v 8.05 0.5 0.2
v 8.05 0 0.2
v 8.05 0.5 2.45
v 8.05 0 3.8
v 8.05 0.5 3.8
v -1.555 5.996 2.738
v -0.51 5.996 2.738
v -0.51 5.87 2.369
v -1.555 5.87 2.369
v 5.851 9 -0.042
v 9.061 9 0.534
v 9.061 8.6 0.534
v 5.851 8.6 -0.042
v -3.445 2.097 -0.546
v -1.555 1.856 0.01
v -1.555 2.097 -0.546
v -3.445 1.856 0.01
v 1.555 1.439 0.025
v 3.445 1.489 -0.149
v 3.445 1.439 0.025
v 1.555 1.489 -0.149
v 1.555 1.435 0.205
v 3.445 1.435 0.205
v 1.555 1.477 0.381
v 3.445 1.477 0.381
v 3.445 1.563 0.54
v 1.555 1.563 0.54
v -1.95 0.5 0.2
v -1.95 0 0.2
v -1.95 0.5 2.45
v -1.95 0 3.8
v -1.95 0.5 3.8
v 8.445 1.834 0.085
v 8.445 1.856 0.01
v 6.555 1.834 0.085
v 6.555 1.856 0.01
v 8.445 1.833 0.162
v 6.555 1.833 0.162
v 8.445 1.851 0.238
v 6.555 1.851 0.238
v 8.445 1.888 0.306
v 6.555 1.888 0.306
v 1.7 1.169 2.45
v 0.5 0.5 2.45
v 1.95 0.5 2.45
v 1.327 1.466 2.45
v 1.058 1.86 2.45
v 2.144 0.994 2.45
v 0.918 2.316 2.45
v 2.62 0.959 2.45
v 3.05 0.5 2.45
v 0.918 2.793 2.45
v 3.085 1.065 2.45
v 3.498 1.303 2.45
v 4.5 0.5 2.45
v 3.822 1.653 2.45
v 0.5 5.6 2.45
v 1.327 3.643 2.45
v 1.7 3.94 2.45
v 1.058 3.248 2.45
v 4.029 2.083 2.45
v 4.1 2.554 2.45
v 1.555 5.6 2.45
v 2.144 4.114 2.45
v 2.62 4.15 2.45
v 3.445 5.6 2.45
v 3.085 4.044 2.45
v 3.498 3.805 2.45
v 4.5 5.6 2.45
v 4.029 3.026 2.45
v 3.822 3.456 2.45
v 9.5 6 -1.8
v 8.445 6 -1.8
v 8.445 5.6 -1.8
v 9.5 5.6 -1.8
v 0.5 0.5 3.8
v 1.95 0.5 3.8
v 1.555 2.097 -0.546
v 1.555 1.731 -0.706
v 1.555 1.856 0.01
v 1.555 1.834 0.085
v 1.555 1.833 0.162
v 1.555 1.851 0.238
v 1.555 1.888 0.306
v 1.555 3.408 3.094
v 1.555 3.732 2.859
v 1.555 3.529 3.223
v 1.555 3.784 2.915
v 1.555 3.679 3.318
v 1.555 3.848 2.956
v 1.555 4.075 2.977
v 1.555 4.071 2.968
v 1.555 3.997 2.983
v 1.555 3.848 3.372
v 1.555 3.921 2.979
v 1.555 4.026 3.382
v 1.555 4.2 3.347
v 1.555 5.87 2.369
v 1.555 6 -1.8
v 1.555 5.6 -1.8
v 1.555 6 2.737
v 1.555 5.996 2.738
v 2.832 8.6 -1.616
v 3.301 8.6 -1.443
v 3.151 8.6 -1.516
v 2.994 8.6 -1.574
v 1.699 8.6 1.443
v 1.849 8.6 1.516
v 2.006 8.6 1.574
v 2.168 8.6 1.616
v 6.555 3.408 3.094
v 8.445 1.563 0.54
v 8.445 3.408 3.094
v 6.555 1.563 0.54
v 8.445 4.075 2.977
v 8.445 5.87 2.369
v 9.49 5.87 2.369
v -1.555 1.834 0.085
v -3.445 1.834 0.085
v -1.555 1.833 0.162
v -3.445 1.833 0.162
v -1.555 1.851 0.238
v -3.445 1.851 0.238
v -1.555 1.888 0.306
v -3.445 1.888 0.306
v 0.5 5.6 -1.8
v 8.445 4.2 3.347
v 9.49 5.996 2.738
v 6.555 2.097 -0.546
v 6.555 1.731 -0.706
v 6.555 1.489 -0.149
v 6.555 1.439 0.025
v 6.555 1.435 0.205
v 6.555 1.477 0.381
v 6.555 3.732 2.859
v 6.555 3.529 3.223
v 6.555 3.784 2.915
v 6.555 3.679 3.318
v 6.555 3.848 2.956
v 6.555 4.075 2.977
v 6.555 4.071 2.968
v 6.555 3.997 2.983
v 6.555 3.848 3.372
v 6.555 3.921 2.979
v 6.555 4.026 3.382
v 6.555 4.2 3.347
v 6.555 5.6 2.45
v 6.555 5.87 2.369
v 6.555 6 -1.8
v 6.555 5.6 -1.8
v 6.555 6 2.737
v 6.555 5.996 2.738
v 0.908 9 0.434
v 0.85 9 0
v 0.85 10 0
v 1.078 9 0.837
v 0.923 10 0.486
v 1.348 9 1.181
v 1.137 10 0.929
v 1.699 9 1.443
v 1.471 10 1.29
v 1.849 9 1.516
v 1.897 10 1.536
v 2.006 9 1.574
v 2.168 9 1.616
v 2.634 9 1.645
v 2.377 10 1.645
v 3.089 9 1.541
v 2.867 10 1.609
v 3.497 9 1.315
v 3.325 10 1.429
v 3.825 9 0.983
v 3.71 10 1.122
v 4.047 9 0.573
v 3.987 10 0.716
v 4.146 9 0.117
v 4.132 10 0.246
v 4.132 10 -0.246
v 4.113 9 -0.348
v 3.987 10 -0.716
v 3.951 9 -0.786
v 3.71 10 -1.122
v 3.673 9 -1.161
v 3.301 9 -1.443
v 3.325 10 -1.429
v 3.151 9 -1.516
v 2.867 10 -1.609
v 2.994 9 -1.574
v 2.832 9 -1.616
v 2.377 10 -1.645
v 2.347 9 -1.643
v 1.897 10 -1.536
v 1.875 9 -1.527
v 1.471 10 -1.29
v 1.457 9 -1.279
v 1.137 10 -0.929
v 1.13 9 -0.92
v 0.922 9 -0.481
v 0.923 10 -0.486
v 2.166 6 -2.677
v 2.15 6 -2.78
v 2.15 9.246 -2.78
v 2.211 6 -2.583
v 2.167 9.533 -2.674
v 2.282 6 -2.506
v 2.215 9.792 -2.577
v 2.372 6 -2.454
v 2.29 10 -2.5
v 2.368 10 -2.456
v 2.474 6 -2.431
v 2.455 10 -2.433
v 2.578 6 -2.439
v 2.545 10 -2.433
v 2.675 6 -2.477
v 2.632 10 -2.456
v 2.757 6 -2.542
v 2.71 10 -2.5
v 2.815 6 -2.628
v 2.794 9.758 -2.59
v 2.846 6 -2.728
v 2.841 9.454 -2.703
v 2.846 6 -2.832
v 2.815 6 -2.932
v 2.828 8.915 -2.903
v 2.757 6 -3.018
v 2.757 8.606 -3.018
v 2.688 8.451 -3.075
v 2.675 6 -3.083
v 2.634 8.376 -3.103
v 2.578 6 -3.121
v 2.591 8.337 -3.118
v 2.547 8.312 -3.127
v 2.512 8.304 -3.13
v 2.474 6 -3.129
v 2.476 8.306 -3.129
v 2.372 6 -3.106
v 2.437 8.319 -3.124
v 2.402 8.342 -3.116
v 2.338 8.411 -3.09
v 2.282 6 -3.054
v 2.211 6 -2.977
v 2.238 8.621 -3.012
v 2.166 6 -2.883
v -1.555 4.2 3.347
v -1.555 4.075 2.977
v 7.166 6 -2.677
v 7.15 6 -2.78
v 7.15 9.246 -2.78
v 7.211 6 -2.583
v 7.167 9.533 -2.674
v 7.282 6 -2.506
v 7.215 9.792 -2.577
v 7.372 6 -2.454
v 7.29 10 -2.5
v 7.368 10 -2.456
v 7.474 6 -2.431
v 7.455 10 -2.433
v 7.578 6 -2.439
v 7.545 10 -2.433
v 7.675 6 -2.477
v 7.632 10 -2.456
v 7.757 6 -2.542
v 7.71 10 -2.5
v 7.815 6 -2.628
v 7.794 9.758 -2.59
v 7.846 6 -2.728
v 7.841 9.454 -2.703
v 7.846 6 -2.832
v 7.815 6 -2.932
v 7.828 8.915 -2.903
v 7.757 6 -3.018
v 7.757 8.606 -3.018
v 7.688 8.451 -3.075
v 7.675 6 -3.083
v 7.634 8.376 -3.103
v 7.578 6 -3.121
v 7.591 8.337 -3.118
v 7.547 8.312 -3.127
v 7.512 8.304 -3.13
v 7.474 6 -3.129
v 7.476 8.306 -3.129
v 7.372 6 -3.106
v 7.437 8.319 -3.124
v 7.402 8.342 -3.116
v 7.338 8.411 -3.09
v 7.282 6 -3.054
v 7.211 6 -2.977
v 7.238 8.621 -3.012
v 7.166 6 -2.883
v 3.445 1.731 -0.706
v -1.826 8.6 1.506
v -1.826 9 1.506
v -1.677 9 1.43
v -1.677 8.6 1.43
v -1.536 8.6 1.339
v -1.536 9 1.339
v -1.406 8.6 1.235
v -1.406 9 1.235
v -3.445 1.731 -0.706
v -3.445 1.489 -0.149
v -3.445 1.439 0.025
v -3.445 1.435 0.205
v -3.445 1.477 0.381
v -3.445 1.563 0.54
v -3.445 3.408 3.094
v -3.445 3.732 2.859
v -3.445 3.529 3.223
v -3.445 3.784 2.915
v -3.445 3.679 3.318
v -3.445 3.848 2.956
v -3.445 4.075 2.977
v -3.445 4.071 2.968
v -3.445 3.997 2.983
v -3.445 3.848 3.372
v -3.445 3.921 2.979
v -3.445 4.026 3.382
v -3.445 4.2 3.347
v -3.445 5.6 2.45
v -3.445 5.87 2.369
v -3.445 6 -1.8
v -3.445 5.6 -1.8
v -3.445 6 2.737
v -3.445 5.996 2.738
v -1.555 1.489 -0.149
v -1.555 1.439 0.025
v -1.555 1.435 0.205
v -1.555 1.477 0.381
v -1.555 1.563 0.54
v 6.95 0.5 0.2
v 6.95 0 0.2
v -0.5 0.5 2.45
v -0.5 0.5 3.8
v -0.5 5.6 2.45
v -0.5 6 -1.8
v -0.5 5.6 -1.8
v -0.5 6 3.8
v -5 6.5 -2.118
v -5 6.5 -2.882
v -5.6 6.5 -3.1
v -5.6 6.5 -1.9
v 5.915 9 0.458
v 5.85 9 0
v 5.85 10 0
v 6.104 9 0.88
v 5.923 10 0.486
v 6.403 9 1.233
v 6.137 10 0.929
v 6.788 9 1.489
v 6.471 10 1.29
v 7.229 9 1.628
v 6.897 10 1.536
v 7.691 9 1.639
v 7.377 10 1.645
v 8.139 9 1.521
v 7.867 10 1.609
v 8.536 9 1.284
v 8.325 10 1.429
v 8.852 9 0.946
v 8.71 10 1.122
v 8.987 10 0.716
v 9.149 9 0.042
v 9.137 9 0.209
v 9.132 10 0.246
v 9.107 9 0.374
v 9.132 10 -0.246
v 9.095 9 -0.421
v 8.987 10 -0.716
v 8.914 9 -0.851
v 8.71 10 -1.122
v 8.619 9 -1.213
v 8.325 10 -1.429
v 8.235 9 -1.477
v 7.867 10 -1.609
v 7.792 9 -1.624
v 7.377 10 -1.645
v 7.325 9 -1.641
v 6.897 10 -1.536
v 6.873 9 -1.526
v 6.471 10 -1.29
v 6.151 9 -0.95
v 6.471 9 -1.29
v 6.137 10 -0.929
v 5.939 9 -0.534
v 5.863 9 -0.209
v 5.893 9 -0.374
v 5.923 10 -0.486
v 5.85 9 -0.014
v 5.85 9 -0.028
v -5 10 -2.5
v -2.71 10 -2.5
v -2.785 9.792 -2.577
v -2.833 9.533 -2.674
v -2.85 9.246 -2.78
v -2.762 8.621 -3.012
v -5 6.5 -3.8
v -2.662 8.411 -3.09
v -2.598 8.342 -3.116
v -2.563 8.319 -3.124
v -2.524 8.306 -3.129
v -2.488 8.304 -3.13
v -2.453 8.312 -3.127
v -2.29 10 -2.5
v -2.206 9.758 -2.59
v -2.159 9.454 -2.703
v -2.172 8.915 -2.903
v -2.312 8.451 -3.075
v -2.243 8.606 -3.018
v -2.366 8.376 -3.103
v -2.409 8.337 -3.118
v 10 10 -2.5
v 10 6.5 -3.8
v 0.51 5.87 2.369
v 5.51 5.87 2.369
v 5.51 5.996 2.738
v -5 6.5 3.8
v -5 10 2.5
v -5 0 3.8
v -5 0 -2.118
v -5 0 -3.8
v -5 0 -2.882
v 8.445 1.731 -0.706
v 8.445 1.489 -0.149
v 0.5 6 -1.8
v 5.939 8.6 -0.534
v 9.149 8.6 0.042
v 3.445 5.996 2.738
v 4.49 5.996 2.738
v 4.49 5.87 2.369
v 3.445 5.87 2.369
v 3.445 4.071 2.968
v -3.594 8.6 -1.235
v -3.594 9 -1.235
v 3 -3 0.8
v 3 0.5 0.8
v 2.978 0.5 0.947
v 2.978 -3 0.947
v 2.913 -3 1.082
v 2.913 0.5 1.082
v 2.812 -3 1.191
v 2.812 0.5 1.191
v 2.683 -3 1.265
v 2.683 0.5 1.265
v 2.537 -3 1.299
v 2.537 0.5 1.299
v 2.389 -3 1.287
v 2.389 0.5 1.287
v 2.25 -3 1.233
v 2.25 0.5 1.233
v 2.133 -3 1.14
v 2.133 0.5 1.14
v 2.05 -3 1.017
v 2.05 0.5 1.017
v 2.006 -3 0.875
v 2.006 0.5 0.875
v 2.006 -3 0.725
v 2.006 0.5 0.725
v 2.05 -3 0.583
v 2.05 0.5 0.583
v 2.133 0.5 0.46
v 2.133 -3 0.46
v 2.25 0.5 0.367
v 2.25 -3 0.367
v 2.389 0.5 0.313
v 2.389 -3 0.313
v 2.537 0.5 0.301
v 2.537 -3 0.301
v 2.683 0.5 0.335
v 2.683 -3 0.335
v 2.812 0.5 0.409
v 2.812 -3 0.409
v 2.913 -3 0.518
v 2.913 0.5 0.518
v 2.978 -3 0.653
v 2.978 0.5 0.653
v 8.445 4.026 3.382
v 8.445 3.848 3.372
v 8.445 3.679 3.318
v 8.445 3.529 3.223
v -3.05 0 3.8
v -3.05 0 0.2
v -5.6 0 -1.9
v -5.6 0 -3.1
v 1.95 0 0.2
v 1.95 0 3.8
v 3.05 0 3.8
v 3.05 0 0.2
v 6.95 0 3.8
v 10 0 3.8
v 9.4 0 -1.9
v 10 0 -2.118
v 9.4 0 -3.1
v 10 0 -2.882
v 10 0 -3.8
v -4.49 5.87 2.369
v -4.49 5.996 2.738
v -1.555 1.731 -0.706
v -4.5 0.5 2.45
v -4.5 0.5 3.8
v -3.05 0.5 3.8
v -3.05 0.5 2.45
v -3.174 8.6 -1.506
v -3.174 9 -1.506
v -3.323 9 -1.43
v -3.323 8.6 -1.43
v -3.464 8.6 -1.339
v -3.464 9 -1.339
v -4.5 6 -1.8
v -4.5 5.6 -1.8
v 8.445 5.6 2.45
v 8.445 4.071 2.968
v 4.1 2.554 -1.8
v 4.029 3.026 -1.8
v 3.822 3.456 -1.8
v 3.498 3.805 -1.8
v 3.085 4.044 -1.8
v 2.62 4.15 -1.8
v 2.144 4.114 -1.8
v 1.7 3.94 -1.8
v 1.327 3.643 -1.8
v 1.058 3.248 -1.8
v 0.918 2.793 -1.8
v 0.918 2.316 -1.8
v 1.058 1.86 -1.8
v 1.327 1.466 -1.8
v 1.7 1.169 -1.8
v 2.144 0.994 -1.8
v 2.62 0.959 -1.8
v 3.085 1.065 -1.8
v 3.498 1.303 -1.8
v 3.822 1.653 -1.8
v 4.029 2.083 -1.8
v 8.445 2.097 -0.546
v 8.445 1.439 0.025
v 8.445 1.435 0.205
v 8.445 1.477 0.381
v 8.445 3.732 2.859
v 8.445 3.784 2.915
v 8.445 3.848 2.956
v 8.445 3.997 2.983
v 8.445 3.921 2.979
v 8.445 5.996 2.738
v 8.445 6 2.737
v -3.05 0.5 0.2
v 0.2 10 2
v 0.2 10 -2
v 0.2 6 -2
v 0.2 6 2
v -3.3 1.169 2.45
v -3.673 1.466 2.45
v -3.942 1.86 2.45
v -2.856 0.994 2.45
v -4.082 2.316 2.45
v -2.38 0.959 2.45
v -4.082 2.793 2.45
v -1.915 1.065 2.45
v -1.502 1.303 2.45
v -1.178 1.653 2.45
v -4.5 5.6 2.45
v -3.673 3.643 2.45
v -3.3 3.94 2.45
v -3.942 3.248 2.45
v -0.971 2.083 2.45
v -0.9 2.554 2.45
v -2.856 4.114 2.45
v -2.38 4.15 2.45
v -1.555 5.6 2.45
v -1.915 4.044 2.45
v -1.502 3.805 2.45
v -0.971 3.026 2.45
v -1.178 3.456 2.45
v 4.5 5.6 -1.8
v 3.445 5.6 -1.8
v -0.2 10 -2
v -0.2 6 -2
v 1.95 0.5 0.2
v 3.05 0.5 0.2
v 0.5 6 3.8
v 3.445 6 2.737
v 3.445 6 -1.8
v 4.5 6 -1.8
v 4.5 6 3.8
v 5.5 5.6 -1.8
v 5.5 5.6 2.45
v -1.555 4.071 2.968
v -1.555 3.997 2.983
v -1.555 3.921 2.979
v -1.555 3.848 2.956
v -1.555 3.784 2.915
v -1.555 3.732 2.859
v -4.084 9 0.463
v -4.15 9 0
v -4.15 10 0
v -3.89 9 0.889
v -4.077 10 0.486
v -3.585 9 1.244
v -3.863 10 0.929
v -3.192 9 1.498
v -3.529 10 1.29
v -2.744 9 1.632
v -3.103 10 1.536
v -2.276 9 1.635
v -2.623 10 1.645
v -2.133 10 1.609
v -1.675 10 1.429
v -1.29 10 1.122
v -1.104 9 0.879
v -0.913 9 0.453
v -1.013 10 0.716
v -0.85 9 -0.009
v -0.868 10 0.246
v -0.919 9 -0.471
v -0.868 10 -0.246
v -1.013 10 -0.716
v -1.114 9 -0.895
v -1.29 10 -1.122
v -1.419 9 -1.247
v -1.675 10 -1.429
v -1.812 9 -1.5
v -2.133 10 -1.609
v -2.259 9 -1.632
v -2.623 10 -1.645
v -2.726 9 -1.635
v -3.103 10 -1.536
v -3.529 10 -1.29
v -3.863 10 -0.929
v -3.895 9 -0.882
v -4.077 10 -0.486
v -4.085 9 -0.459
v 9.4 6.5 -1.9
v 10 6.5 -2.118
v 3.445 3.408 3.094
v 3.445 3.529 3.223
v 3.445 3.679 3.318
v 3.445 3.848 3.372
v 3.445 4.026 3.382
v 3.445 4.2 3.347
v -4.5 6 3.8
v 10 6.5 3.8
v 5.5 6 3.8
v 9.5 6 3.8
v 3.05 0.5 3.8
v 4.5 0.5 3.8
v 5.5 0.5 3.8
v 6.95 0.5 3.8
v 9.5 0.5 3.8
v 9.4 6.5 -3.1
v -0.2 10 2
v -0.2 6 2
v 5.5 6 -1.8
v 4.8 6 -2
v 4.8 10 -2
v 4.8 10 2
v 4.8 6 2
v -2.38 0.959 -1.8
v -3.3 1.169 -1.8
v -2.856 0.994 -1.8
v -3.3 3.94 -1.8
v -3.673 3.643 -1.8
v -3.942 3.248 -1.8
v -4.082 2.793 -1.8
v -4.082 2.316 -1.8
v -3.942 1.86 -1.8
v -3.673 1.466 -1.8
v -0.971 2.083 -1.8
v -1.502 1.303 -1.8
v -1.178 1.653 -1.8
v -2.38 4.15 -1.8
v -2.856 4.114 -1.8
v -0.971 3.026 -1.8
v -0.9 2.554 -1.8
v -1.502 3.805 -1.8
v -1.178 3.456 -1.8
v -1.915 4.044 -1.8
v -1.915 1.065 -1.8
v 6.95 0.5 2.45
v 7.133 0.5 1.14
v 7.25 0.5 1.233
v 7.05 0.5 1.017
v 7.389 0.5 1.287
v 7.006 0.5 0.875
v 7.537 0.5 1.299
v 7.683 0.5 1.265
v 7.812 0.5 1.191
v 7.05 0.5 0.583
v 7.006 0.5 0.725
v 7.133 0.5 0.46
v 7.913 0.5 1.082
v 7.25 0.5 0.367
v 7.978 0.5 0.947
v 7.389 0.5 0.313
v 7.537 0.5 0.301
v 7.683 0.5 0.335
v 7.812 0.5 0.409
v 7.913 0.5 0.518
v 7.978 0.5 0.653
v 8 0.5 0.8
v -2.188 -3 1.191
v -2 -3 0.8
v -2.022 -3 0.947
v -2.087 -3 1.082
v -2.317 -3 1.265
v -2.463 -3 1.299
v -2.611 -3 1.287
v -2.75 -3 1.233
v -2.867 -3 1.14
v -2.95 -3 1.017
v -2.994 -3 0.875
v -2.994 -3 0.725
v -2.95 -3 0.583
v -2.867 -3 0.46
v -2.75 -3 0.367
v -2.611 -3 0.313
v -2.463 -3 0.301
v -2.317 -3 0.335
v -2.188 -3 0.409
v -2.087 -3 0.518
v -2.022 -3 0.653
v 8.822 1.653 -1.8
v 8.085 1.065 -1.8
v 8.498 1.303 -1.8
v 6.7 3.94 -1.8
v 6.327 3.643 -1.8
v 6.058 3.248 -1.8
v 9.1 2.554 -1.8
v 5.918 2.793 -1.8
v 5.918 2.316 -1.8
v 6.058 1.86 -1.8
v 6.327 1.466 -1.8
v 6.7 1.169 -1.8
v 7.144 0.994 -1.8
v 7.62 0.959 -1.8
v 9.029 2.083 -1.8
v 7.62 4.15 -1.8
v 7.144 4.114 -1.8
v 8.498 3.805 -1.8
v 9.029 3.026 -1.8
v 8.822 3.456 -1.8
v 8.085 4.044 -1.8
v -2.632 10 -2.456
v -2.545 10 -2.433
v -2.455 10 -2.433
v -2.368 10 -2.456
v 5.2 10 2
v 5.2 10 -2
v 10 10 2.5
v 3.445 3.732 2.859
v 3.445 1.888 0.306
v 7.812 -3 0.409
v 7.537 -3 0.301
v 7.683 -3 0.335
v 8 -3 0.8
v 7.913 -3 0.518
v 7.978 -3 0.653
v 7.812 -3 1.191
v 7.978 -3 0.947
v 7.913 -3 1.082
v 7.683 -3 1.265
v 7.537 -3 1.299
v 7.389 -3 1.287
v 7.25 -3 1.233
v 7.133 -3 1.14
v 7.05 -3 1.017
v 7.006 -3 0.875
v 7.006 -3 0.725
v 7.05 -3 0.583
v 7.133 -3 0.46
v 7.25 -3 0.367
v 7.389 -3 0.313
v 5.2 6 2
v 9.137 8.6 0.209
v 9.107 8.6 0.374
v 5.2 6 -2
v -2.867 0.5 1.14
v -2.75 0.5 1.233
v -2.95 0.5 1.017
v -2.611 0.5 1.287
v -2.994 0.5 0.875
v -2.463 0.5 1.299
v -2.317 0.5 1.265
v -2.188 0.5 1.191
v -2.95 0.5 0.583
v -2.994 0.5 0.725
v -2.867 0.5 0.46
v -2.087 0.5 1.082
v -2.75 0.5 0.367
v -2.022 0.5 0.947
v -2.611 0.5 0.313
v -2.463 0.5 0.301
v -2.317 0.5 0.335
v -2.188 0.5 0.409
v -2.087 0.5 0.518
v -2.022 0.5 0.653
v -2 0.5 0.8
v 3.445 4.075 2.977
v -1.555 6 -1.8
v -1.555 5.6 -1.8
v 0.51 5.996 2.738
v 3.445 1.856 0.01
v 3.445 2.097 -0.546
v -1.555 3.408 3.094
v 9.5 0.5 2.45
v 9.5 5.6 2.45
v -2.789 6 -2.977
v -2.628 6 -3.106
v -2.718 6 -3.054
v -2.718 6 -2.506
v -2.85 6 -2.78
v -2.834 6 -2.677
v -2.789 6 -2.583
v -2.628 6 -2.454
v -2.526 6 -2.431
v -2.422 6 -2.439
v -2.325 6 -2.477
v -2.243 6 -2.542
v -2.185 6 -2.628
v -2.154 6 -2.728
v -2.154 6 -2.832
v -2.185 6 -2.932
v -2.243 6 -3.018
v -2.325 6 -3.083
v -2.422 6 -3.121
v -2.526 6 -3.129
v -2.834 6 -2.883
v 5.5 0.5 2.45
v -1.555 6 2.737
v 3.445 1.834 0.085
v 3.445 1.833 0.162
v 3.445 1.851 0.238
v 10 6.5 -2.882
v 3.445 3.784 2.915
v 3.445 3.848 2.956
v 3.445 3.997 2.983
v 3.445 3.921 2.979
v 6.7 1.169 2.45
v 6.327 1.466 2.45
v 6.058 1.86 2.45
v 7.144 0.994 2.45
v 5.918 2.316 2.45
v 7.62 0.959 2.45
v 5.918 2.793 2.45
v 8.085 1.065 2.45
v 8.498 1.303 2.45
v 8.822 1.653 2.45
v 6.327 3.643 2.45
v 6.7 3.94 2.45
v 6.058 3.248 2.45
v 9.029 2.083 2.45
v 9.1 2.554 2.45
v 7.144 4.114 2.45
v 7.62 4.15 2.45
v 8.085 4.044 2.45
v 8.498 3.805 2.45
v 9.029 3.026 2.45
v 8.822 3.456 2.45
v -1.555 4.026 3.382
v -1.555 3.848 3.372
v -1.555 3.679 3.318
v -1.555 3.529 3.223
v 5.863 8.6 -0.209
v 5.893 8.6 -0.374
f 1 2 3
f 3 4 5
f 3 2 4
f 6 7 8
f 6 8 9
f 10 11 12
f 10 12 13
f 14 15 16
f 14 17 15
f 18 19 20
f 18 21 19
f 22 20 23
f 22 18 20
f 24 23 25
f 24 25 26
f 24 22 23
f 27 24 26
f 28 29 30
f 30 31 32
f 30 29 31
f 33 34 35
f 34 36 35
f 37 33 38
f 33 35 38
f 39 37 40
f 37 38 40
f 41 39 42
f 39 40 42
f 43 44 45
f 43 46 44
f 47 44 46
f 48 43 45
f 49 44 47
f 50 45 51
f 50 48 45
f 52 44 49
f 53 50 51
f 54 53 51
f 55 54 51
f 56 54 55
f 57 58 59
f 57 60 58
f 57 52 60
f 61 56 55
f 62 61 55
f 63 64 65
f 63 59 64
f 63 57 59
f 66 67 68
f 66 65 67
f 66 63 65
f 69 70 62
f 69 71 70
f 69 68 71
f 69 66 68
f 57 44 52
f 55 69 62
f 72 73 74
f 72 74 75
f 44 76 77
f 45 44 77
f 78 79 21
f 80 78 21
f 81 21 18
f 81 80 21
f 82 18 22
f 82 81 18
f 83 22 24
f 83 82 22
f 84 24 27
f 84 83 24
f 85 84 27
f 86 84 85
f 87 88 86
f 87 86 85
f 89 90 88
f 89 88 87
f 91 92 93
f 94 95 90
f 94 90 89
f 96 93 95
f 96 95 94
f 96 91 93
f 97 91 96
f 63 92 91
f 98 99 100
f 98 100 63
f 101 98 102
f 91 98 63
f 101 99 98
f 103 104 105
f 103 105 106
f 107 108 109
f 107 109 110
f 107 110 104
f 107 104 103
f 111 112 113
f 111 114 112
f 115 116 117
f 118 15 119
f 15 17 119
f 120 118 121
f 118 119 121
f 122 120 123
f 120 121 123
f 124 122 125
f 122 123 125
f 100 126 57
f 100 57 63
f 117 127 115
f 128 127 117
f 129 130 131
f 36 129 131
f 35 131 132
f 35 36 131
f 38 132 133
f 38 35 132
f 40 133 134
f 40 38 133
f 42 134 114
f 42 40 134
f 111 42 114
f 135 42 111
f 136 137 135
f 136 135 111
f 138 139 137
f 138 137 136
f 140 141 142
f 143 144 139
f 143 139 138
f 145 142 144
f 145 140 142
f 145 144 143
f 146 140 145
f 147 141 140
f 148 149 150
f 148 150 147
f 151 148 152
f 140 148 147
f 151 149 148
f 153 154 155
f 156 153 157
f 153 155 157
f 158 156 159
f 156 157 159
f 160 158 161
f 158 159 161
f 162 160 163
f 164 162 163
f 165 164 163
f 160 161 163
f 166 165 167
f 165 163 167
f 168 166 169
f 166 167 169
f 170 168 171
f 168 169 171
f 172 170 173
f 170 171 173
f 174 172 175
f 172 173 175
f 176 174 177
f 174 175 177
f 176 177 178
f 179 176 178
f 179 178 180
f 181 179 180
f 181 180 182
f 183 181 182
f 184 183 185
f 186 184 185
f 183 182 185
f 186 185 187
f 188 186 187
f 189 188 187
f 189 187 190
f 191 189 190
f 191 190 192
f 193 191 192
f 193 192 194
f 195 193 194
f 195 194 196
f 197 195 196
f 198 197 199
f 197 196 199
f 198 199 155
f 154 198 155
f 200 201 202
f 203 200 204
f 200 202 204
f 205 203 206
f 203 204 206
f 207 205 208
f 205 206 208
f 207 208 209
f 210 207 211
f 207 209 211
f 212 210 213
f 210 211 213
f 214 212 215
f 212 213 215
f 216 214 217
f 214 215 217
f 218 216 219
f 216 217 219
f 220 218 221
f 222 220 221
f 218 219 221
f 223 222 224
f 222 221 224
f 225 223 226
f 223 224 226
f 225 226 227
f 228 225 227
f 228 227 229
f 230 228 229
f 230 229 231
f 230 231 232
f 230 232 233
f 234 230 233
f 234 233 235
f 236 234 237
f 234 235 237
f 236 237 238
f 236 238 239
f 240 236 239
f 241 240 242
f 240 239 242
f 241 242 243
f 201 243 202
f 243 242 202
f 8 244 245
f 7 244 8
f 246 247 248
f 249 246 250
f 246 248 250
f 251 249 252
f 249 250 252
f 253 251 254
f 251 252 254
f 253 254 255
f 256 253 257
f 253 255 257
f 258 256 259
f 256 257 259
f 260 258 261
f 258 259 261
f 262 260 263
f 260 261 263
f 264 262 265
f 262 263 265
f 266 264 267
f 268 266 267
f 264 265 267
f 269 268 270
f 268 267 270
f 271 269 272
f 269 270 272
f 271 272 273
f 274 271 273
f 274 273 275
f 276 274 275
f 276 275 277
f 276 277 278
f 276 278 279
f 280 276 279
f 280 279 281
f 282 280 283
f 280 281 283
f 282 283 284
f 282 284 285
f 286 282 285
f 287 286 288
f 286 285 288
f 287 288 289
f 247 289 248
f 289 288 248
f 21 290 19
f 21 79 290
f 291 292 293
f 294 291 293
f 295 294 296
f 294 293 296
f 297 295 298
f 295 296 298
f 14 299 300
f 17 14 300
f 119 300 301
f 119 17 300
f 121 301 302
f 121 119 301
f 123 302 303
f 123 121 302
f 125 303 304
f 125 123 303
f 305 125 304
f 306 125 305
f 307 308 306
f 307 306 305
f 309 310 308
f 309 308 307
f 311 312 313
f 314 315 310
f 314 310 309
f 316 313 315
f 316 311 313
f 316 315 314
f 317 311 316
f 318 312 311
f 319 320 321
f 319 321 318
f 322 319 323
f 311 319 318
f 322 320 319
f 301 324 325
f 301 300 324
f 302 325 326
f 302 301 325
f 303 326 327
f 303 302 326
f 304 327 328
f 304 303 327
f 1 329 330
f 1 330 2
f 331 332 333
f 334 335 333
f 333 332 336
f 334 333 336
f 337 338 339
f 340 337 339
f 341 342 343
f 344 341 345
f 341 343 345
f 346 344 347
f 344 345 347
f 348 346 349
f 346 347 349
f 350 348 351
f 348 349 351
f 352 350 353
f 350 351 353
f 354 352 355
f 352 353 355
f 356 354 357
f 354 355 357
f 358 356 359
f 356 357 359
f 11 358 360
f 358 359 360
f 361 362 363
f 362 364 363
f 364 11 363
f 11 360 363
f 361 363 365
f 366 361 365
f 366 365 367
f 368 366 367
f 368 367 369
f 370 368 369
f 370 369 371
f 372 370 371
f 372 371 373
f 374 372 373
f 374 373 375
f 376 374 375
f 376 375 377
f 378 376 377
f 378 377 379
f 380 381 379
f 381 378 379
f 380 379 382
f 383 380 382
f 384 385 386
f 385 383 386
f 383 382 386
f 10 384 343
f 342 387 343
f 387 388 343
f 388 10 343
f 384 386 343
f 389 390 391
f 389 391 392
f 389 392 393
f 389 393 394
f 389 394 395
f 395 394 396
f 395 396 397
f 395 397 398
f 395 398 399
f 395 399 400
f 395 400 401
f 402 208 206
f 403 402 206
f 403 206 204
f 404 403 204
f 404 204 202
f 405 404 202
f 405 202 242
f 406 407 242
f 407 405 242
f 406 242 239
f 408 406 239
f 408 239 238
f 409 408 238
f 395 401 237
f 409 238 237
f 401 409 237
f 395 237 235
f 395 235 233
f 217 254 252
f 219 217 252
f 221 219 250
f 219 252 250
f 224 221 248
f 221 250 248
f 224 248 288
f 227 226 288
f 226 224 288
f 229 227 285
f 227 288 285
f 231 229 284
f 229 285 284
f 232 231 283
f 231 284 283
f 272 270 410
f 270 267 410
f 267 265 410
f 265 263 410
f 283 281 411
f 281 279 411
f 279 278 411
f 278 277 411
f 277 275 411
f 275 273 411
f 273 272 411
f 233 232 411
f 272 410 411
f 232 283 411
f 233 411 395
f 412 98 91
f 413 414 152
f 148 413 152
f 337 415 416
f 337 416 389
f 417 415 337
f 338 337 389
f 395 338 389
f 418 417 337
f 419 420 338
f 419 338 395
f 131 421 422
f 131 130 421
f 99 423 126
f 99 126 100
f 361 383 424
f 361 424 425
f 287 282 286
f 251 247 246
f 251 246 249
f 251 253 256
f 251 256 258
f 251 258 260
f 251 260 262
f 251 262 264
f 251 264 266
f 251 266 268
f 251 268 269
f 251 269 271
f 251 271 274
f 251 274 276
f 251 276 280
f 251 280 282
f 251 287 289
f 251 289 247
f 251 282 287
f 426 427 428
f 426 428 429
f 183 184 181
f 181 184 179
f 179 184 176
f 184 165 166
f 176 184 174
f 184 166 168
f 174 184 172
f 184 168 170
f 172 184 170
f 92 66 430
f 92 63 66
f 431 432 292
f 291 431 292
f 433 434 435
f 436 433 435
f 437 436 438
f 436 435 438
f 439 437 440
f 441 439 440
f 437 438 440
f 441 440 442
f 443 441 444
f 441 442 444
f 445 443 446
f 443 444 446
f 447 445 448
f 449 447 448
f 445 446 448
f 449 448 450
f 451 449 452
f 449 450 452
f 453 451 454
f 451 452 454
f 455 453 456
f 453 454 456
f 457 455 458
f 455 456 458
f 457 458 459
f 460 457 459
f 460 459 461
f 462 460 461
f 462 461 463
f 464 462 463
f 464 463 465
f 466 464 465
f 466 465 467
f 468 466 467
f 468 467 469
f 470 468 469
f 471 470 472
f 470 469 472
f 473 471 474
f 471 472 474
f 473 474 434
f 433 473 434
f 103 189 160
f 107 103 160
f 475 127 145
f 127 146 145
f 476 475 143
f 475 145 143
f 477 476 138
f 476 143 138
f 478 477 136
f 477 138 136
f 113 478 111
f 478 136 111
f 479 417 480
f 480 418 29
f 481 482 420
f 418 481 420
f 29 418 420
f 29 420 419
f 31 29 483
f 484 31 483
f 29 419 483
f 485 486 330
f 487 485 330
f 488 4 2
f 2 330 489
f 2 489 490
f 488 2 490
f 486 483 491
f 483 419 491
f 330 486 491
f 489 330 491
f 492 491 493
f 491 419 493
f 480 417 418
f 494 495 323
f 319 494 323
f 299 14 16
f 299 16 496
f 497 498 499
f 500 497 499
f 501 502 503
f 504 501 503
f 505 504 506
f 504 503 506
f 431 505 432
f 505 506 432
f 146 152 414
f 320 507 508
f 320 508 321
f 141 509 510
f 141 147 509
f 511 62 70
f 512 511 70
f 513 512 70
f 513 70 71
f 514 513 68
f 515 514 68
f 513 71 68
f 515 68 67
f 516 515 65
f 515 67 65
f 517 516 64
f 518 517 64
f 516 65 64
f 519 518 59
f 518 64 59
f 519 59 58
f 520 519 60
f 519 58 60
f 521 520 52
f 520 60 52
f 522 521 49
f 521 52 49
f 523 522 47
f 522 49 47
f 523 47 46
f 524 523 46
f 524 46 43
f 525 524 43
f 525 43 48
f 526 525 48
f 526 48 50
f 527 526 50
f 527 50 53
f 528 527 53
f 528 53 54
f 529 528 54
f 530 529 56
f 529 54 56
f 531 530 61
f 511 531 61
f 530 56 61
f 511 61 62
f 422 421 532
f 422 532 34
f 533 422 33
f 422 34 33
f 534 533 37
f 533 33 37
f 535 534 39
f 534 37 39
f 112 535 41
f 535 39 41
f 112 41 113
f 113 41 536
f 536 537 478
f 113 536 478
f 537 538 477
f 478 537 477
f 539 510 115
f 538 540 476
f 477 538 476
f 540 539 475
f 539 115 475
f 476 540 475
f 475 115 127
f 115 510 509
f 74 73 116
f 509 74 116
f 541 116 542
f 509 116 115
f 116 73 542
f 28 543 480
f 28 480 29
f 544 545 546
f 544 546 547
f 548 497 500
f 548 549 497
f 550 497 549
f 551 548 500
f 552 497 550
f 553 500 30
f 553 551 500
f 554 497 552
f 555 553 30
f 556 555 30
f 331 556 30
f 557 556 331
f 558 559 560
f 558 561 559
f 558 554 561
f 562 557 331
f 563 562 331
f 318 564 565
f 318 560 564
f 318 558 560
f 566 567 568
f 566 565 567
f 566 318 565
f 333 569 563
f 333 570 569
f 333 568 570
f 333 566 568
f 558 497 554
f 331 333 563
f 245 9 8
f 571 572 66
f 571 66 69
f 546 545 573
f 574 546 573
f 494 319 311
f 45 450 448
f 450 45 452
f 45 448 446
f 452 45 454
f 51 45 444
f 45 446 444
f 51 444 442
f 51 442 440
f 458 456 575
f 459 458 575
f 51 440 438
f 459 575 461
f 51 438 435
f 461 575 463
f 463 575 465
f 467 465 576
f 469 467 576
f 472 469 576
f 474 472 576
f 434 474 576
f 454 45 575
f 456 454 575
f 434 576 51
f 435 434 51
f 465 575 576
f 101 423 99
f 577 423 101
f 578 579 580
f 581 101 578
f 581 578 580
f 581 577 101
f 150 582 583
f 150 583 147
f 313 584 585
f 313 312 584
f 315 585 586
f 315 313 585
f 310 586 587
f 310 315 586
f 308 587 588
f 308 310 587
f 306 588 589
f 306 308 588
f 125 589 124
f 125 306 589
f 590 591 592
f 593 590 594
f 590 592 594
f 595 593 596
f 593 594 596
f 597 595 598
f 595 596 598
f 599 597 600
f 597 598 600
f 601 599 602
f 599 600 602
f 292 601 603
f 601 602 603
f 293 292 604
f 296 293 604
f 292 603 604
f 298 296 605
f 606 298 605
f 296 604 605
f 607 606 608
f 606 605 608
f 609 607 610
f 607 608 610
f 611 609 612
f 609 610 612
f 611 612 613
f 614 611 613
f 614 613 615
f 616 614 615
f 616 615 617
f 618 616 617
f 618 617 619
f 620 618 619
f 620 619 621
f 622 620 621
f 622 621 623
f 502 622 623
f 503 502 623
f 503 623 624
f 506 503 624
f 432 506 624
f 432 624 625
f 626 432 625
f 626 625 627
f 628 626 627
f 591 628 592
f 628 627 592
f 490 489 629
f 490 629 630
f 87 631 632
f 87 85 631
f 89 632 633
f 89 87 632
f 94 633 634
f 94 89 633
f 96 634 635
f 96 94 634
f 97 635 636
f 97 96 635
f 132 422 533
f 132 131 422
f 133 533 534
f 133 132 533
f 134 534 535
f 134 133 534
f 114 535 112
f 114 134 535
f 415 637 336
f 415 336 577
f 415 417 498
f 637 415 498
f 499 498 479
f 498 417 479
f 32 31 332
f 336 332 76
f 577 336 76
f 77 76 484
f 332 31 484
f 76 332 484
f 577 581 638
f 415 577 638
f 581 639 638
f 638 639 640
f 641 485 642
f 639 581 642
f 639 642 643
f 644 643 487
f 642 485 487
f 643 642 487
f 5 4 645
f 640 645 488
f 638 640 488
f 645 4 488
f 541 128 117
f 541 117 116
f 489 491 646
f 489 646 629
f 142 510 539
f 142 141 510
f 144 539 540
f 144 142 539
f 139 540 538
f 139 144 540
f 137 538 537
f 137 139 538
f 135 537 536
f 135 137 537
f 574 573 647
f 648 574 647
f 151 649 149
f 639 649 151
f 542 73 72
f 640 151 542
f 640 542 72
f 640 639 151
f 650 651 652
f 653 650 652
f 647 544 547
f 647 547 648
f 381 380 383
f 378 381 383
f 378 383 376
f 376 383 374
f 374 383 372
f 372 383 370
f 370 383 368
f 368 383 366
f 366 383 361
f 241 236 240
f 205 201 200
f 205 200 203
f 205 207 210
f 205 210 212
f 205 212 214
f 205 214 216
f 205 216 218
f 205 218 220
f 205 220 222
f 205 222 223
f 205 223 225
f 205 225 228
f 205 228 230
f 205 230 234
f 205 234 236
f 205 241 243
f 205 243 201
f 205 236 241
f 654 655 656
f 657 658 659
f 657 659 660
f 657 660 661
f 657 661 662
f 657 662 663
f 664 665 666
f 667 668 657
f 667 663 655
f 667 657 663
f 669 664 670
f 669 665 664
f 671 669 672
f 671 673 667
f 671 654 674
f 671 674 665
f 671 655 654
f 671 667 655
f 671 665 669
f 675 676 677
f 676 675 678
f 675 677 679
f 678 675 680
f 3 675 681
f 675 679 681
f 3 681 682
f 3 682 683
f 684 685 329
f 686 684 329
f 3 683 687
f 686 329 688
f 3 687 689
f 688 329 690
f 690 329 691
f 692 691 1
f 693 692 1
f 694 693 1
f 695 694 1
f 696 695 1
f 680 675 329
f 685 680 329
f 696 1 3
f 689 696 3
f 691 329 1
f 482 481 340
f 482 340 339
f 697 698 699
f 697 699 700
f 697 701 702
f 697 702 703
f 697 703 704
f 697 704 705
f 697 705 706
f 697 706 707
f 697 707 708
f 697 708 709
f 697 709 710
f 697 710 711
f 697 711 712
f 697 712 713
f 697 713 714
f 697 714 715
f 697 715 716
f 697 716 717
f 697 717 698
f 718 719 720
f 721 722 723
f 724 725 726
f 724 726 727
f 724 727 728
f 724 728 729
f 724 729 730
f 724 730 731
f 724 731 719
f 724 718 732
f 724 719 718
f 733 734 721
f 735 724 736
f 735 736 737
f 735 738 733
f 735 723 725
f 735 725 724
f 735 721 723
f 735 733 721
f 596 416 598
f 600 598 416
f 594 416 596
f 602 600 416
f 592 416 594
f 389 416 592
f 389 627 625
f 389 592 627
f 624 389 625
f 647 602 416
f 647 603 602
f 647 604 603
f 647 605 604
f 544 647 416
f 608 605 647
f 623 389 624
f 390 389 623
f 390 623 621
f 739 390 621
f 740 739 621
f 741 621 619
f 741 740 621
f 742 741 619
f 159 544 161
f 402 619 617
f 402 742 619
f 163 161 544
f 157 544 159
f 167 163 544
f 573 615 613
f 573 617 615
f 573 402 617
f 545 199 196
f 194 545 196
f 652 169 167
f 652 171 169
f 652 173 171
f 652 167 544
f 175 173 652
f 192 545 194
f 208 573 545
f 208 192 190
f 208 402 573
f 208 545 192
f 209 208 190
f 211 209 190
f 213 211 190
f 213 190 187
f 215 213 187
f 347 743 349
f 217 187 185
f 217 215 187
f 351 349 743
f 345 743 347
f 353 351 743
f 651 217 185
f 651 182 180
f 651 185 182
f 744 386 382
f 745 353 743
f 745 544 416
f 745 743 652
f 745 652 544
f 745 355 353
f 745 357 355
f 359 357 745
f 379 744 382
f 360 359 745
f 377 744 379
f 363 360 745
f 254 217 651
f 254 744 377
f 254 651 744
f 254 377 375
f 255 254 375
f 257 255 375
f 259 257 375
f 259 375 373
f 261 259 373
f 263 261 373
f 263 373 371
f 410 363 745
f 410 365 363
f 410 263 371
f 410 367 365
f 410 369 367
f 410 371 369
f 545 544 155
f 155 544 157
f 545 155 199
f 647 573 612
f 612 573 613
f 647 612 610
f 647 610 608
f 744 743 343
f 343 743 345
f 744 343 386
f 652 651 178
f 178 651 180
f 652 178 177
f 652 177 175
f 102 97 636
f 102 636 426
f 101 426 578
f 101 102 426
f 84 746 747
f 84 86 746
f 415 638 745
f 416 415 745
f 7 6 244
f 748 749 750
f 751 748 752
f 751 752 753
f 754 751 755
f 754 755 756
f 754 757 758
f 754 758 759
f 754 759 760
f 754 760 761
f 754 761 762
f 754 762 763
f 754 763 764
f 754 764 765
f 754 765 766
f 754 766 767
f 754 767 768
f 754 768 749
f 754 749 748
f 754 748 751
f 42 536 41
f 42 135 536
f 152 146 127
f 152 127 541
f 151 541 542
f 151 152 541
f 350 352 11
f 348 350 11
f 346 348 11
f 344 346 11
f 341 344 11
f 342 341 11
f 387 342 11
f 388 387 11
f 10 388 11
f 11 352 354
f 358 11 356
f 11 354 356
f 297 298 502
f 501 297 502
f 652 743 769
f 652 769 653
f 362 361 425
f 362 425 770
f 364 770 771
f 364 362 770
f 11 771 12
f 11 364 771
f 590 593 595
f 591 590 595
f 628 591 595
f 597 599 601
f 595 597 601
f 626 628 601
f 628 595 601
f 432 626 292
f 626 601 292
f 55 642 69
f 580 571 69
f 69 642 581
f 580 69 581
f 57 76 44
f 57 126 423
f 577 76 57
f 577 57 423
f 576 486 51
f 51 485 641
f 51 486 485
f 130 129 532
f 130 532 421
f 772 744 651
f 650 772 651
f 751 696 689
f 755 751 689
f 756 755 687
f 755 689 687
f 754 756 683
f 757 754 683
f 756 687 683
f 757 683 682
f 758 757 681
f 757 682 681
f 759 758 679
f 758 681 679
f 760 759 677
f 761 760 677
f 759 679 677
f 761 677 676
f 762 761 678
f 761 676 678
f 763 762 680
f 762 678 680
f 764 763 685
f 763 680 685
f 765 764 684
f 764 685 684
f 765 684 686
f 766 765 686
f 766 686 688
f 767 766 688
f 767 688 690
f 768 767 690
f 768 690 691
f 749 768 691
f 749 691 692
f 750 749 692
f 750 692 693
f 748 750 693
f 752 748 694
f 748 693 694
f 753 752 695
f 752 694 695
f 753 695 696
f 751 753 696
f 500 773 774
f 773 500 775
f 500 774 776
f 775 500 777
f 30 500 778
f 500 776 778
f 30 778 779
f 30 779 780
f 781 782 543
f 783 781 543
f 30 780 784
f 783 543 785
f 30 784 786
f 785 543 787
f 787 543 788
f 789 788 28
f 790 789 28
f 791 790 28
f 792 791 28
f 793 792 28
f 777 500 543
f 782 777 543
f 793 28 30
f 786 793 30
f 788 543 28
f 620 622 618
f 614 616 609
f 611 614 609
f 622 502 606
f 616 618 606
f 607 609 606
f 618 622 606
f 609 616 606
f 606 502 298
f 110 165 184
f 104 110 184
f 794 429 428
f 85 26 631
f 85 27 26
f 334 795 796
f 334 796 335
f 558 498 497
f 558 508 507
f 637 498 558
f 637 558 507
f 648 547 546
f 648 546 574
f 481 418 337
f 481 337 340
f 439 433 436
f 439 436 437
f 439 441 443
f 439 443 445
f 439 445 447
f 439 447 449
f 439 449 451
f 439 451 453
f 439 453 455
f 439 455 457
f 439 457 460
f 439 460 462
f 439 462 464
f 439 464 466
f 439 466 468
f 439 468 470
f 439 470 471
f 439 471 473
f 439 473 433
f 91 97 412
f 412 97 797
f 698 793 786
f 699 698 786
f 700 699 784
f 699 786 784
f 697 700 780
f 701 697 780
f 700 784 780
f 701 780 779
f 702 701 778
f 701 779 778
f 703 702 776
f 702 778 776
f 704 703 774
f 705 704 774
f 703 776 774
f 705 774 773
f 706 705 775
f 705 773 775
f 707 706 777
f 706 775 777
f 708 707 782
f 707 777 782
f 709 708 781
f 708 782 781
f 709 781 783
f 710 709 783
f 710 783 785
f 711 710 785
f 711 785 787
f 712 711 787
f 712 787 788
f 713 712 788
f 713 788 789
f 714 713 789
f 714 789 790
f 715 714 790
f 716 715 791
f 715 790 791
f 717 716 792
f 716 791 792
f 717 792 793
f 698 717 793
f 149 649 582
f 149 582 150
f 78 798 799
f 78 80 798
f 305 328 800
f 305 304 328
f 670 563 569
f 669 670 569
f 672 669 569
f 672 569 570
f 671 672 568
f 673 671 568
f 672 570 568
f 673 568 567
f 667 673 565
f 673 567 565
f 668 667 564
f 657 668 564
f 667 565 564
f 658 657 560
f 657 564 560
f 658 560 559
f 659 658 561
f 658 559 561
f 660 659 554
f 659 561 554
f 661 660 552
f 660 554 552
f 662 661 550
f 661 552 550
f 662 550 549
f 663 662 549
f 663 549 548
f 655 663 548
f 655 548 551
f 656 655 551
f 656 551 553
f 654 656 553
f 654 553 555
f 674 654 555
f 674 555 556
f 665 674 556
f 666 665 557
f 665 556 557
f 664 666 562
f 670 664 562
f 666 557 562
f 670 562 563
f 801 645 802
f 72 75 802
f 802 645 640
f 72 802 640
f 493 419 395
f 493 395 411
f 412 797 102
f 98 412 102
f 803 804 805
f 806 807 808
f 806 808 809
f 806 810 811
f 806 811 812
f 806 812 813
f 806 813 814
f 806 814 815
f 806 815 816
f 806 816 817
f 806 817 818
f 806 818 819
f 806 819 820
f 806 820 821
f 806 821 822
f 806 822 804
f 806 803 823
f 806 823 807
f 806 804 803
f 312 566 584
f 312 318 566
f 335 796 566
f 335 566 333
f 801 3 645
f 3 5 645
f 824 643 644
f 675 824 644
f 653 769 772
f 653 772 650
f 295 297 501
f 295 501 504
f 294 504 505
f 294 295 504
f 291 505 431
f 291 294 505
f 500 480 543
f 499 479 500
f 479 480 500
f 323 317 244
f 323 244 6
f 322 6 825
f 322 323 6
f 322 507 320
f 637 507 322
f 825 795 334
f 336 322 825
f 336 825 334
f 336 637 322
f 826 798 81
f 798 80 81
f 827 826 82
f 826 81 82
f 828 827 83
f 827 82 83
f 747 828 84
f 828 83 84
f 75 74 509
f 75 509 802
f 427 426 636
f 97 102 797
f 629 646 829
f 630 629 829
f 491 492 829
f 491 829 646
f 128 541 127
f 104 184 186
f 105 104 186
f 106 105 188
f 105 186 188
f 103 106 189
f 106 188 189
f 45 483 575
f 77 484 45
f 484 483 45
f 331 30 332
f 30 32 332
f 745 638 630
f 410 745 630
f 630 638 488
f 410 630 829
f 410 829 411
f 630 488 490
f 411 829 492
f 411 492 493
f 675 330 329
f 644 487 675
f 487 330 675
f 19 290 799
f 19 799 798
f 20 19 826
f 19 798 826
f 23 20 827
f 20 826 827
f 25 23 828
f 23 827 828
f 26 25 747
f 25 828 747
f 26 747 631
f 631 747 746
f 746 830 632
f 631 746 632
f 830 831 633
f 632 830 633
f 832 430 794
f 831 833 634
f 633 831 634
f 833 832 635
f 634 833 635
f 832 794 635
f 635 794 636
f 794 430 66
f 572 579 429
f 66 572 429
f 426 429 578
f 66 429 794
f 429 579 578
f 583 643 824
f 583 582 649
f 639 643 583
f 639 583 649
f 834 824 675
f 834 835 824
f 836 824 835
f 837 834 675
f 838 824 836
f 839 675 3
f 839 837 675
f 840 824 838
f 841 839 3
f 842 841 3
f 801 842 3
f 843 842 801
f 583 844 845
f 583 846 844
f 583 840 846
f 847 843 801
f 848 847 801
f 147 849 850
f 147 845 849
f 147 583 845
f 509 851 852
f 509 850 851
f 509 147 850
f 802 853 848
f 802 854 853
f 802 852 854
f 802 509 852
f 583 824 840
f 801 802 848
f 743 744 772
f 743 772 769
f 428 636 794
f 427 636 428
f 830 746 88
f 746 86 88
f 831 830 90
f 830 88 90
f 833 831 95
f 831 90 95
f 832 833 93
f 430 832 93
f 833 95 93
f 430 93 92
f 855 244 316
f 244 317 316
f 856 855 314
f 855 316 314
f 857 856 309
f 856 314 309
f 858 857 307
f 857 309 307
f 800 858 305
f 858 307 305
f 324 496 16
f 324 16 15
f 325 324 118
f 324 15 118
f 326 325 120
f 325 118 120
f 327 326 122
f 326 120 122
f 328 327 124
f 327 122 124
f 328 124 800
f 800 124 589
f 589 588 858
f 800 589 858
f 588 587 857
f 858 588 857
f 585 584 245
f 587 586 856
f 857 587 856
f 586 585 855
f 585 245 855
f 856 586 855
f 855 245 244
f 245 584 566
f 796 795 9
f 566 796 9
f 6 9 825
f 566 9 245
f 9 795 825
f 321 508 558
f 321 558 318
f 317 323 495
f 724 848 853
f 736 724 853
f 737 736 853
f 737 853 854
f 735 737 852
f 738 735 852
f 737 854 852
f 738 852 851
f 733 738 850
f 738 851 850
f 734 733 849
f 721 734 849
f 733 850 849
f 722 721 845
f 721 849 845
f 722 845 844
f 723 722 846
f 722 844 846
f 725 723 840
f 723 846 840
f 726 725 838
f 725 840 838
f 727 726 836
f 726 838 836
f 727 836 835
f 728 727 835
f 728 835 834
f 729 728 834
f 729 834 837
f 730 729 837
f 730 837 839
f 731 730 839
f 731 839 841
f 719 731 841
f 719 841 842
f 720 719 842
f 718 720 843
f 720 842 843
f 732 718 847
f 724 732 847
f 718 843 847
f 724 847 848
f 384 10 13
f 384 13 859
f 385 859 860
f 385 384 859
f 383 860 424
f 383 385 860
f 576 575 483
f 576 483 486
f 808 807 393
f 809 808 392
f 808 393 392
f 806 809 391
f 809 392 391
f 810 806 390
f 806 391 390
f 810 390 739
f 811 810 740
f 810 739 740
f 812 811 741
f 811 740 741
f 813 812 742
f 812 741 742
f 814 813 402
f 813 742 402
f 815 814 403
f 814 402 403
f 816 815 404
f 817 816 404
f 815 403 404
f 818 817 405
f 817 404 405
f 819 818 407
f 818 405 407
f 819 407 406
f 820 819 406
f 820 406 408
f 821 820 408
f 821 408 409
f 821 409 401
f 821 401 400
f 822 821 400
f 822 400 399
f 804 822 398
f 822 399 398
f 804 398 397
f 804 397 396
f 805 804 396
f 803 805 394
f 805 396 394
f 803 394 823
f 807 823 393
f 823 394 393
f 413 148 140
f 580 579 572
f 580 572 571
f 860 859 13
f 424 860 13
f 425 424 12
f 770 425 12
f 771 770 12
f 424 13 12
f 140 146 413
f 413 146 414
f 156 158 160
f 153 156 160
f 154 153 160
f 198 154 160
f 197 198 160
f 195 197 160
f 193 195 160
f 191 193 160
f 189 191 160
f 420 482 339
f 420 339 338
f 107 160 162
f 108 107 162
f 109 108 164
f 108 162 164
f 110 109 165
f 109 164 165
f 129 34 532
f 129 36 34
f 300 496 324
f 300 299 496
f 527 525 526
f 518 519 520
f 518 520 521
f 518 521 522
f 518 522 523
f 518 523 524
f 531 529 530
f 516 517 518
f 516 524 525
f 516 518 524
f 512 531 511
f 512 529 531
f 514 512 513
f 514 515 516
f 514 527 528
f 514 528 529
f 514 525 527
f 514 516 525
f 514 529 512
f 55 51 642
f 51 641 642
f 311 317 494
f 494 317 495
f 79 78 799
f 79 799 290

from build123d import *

# Parameters (mm, degrees)
SKETCH1_W               = 15
SKETCH1_H               = 7.6
EXTRUDE1_DEPTH          = 10
SKETCH2_OUTSIDE_W       = 13.512
SKETCH2_OUTSIDE_H       = 15.912
CUT_EXTRUDE1_DEPTH      = 11
CUT_EXTRUDE1_DEPTH_BACK = 6
SKETCH3_R               = 1.65
SKETCH3_R_2             = 0.35
SKETCH3_W               = 0.4
SKETCH3_H               = 4
CUT_EXTRUDE2_DEPTH      = 4
SKETCH4_W               = 4
SKETCH4_H               = 5.5
CUT_EXTRUDE3_DEPTH      = 5.6
EXTRUDE3_DEPTH          = 6.5
CUT_EXTRUDE5_DEPTH      = 6.5
SKETCH10_W              = 1.1
SKETCH10_H              = 0.5
CUT_EXTRUDE6_DEPTH      = 3.6
SKETCH5_W               = 4
SKETCH5_H               = 5.1
EXTRUDE2_DEPTH          = 4.25
SKETCH6_R               = 1.6
CUT_EXTRUDE4_DEPTH      = 4.25
SKETCH11_R              = 0.5
EXTRUDE4_DEPTH          = 3.5
SKETCH12_R              = 1.65
EXTRUDE5_DEPTH          = 3
CUT_EXTRUDE7_DEPTH      = 0.4
EXTRUDE6_DEPTH          = 0.945
EXTRUDE9_DEPTH          = 0.39
LPATTERN1_COUNT         = 3
LPATTERN1_PITCH         = 5
FILLET1_R               = 0.3
FILLET2_R               = 0.7


with BuildPart() as part:
    # Sketch1 → Extrude1 (new body)
    with BuildSketch(Plane(origin=(0, 0, 0), x_dir=(1, 0, 0), z_dir=(0, 1, 0))):
        with Locations((2.5, 0)):
            Rectangle(SKETCH1_W, SKETCH1_H)
    extrude(amount=EXTRUDE1_DEPTH)

    # Sketch2 outside → Cut-Extrude1 (cut, two sides)
    with BuildSketch(Plane(origin=(0, 0, 0), x_dir=(0, 0, -1), z_dir=(1, 0, 0))) as cut_extrude1_sk:
        with Locations((0, 5)):
            Rectangle(SKETCH2_OUTSIDE_W, SKETCH2_OUTSIDE_H)
        Polygon((2.5, 10), (3.8, 6.5), (3.8, 0), (-3.8, 0), (-3.8, 6.5), (-2.5, 10), align=None, mode=Mode.SUBTRACT)
    extrude(amount=CUT_EXTRUDE1_DEPTH, mode=Mode.SUBTRACT)
    extrude(cut_extrude1_sk.sketch, amount=-CUT_EXTRUDE1_DEPTH_BACK, mode=Mode.SUBTRACT)

    # Sketch3 → Cut-Extrude2 (cut)
    with BuildSketch(Plane(origin=(0, 10, 0), x_dir=(-1, 0, 0), z_dir=(0, 1, 0))):
        with Locations((2.5, 0)):
            Circle(SKETCH3_R)
        with Locations((-2.5, 0)):
            Circle(SKETCH3_R)
        with Locations((2.5, -2.78)):
            Circle(SKETCH3_R_2)
        with Locations((-2.5, -2.78)):
            Circle(SKETCH3_R_2)
        with Locations((-7.5, 0)):
            Circle(SKETCH3_R)
        with Locations((-7.5, -2.78)):
            Circle(SKETCH3_R_2)
        Rectangle(SKETCH3_W, SKETCH3_H)
        with Locations((-5, 0)):
            Rectangle(SKETCH3_W, SKETCH3_H)
    extrude(amount=-CUT_EXTRUDE2_DEPTH, mode=Mode.SUBTRACT)

    # Sketch4 → Cut-Extrude3 (cut)
    with BuildSketch(Plane.XY.offset(3.8)):
        with Locations((-2.5, 3.25)):
            Rectangle(SKETCH4_W, SKETCH4_H)
        with Locations((2.5, 3.25)):
            Rectangle(SKETCH4_W, SKETCH4_H)
        with Locations((7.5, 3.25)):
            Rectangle(SKETCH4_W, SKETCH4_H)
    extrude(amount=-CUT_EXTRUDE3_DEPTH, mode=Mode.SUBTRACT)

    # Sketch7 → Extrude3 (add)
    with BuildSketch(Plane(origin=(0, 0, 0), x_dir=(1, 0, 0), z_dir=(0, 1, 0))):
        Polygon((-5.6, 3.1), (-5, 2.881617859), (-5, 2.118382141), (-5.6, 1.9), align=None)
    extrude(amount=EXTRUDE3_DEPTH)

    # Sketch9 → Cut-Extrude5 (cut)
    with BuildSketch(Plane(origin=(0, 0, 0), x_dir=(1, 0, 0), z_dir=(0, 1, 0))):
        Polygon((10, 2.881617859), (9.4, 3.1), (9.4, 1.9), (10, 2.118382141), align=None)
    extrude(amount=CUT_EXTRUDE5_DEPTH, mode=Mode.SUBTRACT)

    # Sketch10 → Cut-Extrude6 (cut)
    with BuildSketch(Plane.XY.offset(3.8)):
        with Locations((-2.5, 0.25)):
            Rectangle(SKETCH10_W, SKETCH10_H)
        with Locations((2.5, 0.25)):
            Rectangle(SKETCH10_W, SKETCH10_H)
        with Locations((7.5, 0.25)):
            Rectangle(SKETCH10_W, SKETCH10_H)
    extrude(amount=-CUT_EXTRUDE6_DEPTH, mode=Mode.SUBTRACT)

    # Sketch5 → Extrude2 (add)
    with BuildSketch(Plane.XY.offset(-1.8)):
        with Locations((-2.5, 3.05)):
            Rectangle(SKETCH5_W, SKETCH5_H)
        with Locations((2.5, 3.05)):
            Rectangle(SKETCH5_W, SKETCH5_H)
        with Locations((7.5, 3.05)):
            Rectangle(SKETCH5_W, SKETCH5_H)
    extrude(amount=EXTRUDE2_DEPTH)

    # Sketch6 → Cut-Extrude4 (cut)
    with BuildSketch(Plane.XY.offset(2.45)):
        with Locations((-2.5, 2.554263468)):
            Circle(SKETCH6_R)
        with Locations((2.5, 2.554263468)):
            Circle(SKETCH6_R)
        with Locations((7.5, 2.554263468)):
            Circle(SKETCH6_R)
    extrude(amount=-CUT_EXTRUDE4_DEPTH, mode=Mode.SUBTRACT)

    # Sketch11 → Extrude4 (add)
    with BuildSketch(Plane.XZ.offset(-0.5)):
        with Locations((-2.5, 0.8)):
            Circle(SKETCH11_R)
        with Locations((2.5, 0.8)):
            Circle(SKETCH11_R)
        with Locations((7.5, 0.8)):
            Circle(SKETCH11_R)
    extrude(amount=EXTRUDE4_DEPTH)

    # Sketch12 → Extrude5 (add)
    with BuildSketch(Plane.XZ.offset(-6)):
        with Locations((2.5, 0)):
            Circle(SKETCH12_R)
        with Locations((-2.5, 0)):
            Circle(SKETCH12_R)
        with Locations((7.5, 0)):
            Circle(SKETCH12_R)
    extrude(amount=-EXTRUDE5_DEPTH)

    # Sketch13 → Cut-Extrude7 (cut)
    with BuildSketch(Plane(origin=(0, 9, 0), x_dir=(-1, 0, 0), z_dir=(0, 1, 0))):
        with BuildLine():
            Line((3.594307251, -1.234905519), (1.825829895, 1.505986278))
            ThreePointArc((1.825829895, 1.505986278), (1.605433494, 1.386452583), (1.405692749, 1.234905519))
            Line((1.405692749, 1.234905519), (3.174170105, -1.505986278))
            ThreePointArc((3.174170105, -1.505986278), (3.394566506, -1.386452583), (3.594307251, -1.234905519))
        make_face()
        with BuildLine():
            Line((-5.938894906, -0.534276038), (-9.149461674, 0.042144841))
            ThreePointArc((-9.149461674, 0.042144841), (-9.12403295, 0.291576712), (-9.061105094, 0.534276038))
            Line((-9.061105094, 0.534276038), (-5.850538326, -0.042144841))
            ThreePointArc((-5.850538326, -0.042144841), (-5.87596705, -0.291576712), (-5.938894906, -0.534276038))
        make_face()
        with BuildLine():
            Line((-2.83217089, -1.616218581), (-1.698971441, 1.44251629))
            ThreePointArc((-1.698971441, 1.44251629), (-1.926782442, 1.54723031), (-2.16782911, 1.616218581))
            Line((-2.16782911, 1.616218581), (-3.301028559, -1.44251629))
            ThreePointArc((-3.301028559, -1.44251629), (-3.073217558, -1.54723031), (-2.83217089, -1.616218581))
        make_face()
    extrude(amount=-CUT_EXTRUDE7_DEPTH, mode=Mode.SUBTRACT)

    # Sketch14 → Extrude6 (add, symmetric)
    with BuildSketch(Plane.ZY.offset(2.5)):
        Polygon((2.45, 5.6), (3.03887637, 3.861674443), (0.167170254, 1.787608865), (-0.546359637, 2.097431054), (-0.705673534, 1.730526322), (0.216750724, 1.33), (3.512480259, 3.710312924), (2.736824279, 6), (-1.8, 6), (-1.8, 5.6), align=None)
    extrude6 = extrude(amount=EXTRUDE6_DEPTH, both=True)

    # Sketch15 → Extrude9 (add)
    with BuildSketch(Plane(origin=(0, 1.449355072, 4.278403908), x_dir=(1, 0, 0), z_dir=(0, 0.320850379, 0.947129893))):
        Polygon((-1.555, 4.8), (-1.555, 2.903968921), (-0.51, 4.8), align=None)
        Polygon((-3.445, 4.8), (-3.445, 2.903968921), (-4.49, 4.8), align=None)
    extrude9 = extrude(amount=-EXTRUDE9_DEPTH)

    # LPattern1: Extrude6, Extrude9 ×3
    with Locations(*[(i * LPATTERN1_PITCH, 0, 0) for i in range(1, LPATTERN1_COUNT)]):
        add(extrude6)
        add(extrude9)

    # Fillet1
    fillet1_edges = [part.edges().sort_by_distance(p)[0] for p in [
        (-2.5, 3.861674443, 3.03887637),
        (-2.5, 1.787608865, 0.167170254),
        (2.5, 3.861674443, 3.03887637),
        (2.5, 1.787608865, 0.167170254),
        (7.5, 3.861674443, 3.03887637),
        (7.5, 1.787608865, 0.167170254),
    ]]
    fillet(fillet1_edges, radius=FILLET1_R)

    # Fillet2
    fillet2_edges = [part.edges().sort_by_distance(p)[0] for p in [
        (-2.5, 3.710312924, 3.512480259),
        (-2.5, 1.33, 0.216750724),
        (2.5, 1.33, 0.216750724),
        (2.5, 3.710312924, 3.512480259),
        (7.5, 3.710312924, 3.512480259),
        (7.5, 1.33, 0.216750724),
    ]]
    fillet(fillet2_edges, radius=FILLET2_R)


solid = part.part
